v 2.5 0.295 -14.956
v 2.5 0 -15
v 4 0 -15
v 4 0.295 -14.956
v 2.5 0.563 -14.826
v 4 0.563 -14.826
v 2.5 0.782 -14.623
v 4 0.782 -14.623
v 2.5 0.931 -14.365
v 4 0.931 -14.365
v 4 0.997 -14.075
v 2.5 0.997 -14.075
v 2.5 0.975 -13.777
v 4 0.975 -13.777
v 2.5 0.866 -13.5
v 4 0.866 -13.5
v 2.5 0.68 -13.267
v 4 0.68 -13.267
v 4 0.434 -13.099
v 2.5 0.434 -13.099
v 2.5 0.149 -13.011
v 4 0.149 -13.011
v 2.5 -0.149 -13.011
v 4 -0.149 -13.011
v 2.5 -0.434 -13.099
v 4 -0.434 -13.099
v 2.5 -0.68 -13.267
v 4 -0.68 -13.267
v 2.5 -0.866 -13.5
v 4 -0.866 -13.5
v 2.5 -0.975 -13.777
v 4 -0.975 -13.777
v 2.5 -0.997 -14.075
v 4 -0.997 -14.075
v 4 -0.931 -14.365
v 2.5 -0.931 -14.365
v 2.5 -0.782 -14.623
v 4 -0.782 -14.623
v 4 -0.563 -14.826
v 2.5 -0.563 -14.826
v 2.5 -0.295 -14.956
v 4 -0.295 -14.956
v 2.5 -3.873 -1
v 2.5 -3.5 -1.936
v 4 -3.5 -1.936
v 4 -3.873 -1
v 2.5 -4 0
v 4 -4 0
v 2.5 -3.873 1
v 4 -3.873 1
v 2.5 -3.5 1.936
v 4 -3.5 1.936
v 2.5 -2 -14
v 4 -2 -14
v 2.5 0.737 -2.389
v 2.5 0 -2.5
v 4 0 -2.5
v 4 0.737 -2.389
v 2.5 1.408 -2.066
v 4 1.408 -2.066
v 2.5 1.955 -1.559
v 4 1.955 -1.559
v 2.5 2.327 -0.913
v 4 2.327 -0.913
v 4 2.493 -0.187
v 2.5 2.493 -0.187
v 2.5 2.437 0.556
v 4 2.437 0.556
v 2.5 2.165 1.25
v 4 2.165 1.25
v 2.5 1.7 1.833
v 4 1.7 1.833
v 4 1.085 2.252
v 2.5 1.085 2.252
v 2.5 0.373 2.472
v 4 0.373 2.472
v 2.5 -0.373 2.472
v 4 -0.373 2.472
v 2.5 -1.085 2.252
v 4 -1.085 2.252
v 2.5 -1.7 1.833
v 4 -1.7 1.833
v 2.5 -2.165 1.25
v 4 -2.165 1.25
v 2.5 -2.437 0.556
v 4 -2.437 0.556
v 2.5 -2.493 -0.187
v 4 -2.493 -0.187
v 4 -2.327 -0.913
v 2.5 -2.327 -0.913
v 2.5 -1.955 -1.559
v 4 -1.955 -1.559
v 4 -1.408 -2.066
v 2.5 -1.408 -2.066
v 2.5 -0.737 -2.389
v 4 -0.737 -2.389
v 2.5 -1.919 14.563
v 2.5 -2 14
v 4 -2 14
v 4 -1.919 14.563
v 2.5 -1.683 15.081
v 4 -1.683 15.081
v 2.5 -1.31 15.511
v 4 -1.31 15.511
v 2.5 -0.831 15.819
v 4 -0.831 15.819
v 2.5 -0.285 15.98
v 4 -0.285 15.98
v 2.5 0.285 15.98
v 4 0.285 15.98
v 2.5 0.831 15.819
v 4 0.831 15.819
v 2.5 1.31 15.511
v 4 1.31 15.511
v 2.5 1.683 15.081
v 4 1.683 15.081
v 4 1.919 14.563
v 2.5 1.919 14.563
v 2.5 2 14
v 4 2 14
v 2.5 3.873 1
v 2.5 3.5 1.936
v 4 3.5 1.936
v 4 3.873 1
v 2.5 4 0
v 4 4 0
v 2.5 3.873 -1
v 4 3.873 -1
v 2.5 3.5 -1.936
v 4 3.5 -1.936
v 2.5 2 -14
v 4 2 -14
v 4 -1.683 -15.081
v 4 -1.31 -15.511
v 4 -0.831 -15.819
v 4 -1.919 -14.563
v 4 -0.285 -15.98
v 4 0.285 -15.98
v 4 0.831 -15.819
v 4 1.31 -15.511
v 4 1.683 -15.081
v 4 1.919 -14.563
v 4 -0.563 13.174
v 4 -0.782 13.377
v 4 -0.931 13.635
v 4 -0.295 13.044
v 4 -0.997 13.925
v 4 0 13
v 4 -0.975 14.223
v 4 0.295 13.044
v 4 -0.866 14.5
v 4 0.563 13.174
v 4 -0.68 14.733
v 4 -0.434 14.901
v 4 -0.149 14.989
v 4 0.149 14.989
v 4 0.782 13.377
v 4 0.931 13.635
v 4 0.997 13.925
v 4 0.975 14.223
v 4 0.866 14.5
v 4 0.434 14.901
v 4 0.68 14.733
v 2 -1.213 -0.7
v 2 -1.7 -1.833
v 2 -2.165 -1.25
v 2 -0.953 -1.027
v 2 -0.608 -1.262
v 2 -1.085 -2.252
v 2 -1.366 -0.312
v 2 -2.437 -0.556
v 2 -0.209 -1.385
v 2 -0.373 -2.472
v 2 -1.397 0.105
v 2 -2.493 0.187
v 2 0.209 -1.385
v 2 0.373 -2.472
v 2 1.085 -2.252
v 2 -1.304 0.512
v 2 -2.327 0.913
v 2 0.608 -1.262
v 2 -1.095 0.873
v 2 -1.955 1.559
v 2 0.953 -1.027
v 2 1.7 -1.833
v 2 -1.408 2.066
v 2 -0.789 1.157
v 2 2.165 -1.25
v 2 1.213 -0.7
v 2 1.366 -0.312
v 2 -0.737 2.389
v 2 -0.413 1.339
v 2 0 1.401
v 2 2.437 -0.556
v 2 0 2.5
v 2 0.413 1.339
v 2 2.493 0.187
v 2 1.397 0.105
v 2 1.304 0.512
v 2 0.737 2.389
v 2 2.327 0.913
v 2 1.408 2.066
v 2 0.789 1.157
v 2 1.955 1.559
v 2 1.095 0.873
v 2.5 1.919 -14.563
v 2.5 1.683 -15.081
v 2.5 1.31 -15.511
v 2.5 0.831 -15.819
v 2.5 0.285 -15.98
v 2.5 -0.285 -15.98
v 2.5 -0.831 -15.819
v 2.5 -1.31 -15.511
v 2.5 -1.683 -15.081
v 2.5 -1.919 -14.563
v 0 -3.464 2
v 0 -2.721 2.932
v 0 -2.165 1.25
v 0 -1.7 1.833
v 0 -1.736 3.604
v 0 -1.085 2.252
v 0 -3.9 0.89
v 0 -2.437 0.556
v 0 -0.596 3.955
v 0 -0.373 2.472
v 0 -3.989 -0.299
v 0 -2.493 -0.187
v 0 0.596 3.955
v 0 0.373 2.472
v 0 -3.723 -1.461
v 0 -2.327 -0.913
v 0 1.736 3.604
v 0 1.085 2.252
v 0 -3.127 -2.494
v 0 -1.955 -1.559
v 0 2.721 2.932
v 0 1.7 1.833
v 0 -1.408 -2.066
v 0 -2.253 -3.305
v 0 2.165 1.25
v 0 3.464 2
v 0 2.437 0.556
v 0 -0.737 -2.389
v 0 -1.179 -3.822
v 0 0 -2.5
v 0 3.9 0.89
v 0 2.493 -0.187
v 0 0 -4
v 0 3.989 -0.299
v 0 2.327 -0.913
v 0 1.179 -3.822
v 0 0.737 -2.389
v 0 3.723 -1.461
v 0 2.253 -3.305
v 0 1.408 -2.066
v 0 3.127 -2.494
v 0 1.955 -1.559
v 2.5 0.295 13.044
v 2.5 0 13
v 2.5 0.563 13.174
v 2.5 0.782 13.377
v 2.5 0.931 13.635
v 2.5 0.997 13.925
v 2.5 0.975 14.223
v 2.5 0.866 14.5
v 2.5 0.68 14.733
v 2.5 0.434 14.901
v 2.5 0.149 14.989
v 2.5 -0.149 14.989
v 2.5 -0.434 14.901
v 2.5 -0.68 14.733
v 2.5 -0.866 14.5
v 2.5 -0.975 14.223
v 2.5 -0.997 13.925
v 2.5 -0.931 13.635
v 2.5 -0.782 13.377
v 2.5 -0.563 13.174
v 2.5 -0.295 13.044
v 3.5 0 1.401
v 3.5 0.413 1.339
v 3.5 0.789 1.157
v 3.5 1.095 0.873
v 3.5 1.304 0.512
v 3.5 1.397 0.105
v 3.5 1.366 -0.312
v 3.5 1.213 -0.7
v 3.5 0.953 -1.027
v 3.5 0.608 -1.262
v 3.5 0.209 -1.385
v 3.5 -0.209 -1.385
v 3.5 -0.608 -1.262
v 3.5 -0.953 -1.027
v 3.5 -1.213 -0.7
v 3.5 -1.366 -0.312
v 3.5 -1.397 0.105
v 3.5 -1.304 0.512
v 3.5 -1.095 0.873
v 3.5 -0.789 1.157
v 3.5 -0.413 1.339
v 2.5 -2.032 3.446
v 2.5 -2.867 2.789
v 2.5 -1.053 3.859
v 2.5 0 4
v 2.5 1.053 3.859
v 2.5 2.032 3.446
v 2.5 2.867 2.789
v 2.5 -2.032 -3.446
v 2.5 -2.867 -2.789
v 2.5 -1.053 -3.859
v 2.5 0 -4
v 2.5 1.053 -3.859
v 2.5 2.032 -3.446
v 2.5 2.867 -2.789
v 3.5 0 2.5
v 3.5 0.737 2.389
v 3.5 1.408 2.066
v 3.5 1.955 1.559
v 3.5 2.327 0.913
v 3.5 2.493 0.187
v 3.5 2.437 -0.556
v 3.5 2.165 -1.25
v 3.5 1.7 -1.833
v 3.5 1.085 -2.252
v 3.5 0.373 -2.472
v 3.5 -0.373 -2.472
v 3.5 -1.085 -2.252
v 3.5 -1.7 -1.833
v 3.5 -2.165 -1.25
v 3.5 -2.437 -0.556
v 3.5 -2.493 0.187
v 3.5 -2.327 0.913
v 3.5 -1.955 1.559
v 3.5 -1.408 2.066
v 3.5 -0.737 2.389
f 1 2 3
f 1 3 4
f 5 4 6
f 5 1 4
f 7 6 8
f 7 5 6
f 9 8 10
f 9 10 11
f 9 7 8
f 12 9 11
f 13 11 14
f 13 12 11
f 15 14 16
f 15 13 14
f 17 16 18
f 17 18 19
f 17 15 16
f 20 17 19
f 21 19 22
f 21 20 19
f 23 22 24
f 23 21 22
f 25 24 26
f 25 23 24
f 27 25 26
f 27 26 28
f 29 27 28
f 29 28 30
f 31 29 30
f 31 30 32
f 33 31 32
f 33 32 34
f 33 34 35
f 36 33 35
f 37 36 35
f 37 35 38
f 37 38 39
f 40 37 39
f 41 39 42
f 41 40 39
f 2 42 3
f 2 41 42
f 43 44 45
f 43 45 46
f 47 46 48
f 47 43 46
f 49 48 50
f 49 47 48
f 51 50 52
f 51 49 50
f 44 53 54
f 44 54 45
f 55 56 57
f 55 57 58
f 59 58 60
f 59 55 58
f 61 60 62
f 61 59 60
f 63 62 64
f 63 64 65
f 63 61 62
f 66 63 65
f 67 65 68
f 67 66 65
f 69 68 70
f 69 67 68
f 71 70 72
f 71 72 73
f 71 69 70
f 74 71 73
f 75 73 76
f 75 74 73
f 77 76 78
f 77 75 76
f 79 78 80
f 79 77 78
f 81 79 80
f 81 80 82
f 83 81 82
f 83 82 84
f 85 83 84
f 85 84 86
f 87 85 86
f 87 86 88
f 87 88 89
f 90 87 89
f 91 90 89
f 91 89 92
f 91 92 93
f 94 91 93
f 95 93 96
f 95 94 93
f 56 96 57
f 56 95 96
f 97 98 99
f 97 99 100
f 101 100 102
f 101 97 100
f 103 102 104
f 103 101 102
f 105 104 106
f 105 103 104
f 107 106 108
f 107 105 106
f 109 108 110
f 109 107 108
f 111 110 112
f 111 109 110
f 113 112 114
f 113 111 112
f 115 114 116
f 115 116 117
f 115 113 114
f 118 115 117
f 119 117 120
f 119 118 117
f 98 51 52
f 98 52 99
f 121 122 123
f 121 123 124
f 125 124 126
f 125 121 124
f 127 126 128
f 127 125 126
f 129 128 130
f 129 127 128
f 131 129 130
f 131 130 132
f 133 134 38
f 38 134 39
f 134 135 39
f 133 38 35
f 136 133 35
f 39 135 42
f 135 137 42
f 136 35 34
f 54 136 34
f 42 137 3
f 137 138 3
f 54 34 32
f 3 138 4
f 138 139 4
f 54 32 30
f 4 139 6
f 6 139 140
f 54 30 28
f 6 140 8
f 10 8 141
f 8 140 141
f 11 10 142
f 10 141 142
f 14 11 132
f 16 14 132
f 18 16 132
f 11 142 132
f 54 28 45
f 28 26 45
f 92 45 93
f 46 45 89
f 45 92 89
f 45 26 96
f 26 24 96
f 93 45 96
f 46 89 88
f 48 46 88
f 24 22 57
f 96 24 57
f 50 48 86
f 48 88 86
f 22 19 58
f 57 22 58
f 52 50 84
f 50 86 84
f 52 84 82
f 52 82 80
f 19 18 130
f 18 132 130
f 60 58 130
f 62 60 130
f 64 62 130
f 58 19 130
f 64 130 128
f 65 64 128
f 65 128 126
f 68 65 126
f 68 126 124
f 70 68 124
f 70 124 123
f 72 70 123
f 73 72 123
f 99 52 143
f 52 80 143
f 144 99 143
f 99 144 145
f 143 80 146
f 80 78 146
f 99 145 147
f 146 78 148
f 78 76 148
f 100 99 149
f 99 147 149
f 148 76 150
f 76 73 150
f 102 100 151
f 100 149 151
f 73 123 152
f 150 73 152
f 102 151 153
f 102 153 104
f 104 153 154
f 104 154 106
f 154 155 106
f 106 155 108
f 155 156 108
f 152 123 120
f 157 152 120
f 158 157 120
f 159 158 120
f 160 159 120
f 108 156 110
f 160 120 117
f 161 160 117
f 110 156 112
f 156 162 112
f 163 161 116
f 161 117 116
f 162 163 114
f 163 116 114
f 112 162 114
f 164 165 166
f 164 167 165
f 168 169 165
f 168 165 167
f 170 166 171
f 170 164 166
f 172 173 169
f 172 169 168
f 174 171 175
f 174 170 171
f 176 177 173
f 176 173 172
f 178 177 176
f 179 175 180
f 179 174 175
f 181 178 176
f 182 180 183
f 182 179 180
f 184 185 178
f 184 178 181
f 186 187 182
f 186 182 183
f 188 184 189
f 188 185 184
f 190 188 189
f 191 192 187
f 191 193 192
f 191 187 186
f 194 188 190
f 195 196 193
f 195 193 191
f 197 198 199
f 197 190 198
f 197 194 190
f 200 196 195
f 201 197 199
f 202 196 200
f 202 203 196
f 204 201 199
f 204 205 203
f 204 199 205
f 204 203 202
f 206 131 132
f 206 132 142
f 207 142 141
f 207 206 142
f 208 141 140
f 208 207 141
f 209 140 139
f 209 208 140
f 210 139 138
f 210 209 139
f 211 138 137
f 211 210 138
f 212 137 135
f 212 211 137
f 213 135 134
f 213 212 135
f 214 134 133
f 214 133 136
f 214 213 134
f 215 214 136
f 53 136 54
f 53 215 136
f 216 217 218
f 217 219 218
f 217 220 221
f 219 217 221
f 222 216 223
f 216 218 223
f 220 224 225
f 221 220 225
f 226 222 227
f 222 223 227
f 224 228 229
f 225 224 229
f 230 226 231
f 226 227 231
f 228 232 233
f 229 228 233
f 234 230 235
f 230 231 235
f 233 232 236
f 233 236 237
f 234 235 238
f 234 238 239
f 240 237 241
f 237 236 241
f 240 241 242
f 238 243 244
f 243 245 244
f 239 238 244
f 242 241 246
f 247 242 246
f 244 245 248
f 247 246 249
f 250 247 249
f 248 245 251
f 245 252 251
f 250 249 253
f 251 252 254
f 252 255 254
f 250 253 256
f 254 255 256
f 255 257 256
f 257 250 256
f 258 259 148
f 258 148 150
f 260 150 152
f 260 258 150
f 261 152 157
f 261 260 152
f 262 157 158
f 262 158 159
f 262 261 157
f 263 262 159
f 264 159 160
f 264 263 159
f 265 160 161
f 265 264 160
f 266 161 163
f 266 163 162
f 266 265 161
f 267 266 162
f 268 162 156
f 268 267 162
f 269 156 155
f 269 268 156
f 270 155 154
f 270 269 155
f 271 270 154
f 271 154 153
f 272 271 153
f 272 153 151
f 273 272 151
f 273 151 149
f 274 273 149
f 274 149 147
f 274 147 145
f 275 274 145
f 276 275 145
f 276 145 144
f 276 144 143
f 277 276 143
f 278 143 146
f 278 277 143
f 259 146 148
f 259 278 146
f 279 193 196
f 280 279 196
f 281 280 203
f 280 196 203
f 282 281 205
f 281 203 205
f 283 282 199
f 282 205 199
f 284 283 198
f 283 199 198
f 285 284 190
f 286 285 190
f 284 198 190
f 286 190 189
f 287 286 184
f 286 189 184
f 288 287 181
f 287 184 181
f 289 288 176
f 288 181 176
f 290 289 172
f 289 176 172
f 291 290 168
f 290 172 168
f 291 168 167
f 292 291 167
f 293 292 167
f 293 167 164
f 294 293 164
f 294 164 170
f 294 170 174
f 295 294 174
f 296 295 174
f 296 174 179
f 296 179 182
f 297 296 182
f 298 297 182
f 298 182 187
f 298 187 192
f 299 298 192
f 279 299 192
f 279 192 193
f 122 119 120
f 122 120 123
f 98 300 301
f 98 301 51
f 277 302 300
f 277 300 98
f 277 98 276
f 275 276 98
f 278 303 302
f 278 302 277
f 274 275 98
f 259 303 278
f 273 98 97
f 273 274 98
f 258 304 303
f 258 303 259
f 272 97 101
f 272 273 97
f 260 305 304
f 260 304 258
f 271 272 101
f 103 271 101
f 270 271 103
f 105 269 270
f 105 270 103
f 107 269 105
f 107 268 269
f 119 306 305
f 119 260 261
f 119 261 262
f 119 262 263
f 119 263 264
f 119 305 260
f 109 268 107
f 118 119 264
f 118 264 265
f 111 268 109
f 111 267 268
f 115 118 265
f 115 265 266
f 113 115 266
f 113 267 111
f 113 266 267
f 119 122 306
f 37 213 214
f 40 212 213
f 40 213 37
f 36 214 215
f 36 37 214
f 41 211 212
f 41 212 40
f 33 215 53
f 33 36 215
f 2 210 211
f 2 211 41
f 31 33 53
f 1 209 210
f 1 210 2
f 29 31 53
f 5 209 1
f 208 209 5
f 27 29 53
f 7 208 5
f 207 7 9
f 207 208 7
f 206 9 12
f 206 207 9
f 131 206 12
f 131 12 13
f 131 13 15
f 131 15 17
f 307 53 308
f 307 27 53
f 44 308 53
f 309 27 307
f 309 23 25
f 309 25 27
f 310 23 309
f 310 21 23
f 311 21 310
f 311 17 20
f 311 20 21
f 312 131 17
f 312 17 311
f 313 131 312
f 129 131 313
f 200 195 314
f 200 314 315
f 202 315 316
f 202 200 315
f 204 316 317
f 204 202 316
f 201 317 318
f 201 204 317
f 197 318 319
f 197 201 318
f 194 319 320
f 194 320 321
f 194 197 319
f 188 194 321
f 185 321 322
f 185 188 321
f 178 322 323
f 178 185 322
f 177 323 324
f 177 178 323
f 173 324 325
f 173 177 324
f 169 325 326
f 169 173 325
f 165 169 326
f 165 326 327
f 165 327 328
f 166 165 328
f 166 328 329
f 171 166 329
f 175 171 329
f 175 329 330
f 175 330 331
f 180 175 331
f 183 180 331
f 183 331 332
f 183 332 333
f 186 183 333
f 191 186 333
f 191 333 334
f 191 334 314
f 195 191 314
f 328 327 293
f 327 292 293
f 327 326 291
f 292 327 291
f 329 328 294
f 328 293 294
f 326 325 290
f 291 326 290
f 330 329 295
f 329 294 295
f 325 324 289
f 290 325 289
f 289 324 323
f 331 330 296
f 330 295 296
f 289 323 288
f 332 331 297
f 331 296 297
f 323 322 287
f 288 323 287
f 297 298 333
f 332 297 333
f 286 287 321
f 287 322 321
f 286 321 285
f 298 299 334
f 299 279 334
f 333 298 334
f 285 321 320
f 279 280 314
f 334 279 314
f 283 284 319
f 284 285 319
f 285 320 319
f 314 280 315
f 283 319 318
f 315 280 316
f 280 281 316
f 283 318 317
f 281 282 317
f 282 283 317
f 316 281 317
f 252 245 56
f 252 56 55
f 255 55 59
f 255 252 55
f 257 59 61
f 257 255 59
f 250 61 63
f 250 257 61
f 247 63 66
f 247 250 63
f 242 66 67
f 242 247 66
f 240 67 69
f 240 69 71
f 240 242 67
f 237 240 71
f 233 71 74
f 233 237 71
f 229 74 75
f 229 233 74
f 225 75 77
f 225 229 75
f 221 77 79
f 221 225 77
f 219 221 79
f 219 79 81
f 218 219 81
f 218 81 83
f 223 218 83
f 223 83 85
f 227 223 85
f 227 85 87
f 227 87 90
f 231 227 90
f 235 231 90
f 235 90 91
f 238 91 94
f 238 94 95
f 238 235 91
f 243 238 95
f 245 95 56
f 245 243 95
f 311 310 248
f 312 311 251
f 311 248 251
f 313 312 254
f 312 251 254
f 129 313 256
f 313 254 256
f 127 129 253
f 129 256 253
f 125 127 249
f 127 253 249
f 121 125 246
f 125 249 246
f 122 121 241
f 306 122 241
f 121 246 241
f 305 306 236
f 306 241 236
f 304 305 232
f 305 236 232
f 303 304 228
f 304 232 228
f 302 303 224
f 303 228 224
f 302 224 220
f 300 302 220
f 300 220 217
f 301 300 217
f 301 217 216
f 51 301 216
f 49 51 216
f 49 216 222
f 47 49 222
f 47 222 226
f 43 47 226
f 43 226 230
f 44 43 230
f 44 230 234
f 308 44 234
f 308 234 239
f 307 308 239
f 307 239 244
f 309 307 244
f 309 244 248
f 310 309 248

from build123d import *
from build123d.topology import SkipClean

# Parameters (mm, degrees)
SKETCH2_R           = 4
SKETCH2_R_2         = 2.5
BOSS_EXTRUDE1_DEPTH = 2.5
SKETCH3_R           = 2.5
SKETCH3_R_2         = 1
BOSS_EXTRUDE2_DEPTH = 1.5
SKETCH4_R           = 2.5
SKETCH4_R_2         = 1.400921988
BOSS_EXTRUDE3_DEPTH = 3.5
SKETCH6_R           = 2.5
CUT_EXTRUDE2_DEPTH  = 2


with BuildPart() as part:
    # Sketch2 → Boss-Extrude1 (new body)
    with BuildSketch(Plane(origin=(0, 0, 0), x_dir=(0, 0, -1), z_dir=(1, 0, 0))):
        Circle(SKETCH2_R)
        Circle(SKETCH2_R_2, mode=Mode.SUBTRACT)
    extrude(amount=BOSS_EXTRUDE1_DEPTH)

    # Sketch3 → Boss-Extrude2 (add)
    with SkipClean():  # the faces are left unmerged after this step: merging them gives an invalid solid
        with BuildSketch(Plane(origin=(2.5, 0, 0), x_dir=(0, 0, -1), z_dir=(1, 0, 0))):
            with BuildLine():
                Line((-1.936491673, -3.5), (-14, -2))
                ThreePointArc((-14, -2), (-16, 0), (-14, 2))
                Line((-14, 2), (-1.936491673, 3.5))
                ThreePointArc((-1.936491673, 3.5), (0, 4), (1.936491673, 3.5))
                Line((1.936491673, 3.5), (14, 2))
                ThreePointArc((14, 2), (16, 0), (14, -2))
                Line((14, -2), (1.936491673, -3.5))
                ThreePointArc((1.936491673, -3.5), (0, -4), (-1.936491673, -3.5))
            make_face()
            Circle(SKETCH3_R, mode=Mode.SUBTRACT)
            with Locations((-14, 0)):
                Circle(SKETCH3_R_2, mode=Mode.SUBTRACT)
            with Locations((14, 0)):
                Circle(SKETCH3_R_2, mode=Mode.SUBTRACT)
        extrude(amount=BOSS_EXTRUDE2_DEPTH)


with BuildPart() as body_2:
    # Sketch4 → Boss-Extrude3 (new body)
    with BuildSketch(Plane.ZY):
        Circle(SKETCH4_R)
        Circle(SKETCH4_R_2, mode=Mode.SUBTRACT)
    extrude(amount=-BOSS_EXTRUDE3_DEPTH)

    # Sketch6 → Cut-Extrude2 (cut)
    with BuildSketch(Plane.ZY):
        Circle(SKETCH6_R)
    extrude(amount=-CUT_EXTRUDE2_DEPTH, mode=Mode.SUBTRACT)


solid = Compound([part.part, body_2.part])
